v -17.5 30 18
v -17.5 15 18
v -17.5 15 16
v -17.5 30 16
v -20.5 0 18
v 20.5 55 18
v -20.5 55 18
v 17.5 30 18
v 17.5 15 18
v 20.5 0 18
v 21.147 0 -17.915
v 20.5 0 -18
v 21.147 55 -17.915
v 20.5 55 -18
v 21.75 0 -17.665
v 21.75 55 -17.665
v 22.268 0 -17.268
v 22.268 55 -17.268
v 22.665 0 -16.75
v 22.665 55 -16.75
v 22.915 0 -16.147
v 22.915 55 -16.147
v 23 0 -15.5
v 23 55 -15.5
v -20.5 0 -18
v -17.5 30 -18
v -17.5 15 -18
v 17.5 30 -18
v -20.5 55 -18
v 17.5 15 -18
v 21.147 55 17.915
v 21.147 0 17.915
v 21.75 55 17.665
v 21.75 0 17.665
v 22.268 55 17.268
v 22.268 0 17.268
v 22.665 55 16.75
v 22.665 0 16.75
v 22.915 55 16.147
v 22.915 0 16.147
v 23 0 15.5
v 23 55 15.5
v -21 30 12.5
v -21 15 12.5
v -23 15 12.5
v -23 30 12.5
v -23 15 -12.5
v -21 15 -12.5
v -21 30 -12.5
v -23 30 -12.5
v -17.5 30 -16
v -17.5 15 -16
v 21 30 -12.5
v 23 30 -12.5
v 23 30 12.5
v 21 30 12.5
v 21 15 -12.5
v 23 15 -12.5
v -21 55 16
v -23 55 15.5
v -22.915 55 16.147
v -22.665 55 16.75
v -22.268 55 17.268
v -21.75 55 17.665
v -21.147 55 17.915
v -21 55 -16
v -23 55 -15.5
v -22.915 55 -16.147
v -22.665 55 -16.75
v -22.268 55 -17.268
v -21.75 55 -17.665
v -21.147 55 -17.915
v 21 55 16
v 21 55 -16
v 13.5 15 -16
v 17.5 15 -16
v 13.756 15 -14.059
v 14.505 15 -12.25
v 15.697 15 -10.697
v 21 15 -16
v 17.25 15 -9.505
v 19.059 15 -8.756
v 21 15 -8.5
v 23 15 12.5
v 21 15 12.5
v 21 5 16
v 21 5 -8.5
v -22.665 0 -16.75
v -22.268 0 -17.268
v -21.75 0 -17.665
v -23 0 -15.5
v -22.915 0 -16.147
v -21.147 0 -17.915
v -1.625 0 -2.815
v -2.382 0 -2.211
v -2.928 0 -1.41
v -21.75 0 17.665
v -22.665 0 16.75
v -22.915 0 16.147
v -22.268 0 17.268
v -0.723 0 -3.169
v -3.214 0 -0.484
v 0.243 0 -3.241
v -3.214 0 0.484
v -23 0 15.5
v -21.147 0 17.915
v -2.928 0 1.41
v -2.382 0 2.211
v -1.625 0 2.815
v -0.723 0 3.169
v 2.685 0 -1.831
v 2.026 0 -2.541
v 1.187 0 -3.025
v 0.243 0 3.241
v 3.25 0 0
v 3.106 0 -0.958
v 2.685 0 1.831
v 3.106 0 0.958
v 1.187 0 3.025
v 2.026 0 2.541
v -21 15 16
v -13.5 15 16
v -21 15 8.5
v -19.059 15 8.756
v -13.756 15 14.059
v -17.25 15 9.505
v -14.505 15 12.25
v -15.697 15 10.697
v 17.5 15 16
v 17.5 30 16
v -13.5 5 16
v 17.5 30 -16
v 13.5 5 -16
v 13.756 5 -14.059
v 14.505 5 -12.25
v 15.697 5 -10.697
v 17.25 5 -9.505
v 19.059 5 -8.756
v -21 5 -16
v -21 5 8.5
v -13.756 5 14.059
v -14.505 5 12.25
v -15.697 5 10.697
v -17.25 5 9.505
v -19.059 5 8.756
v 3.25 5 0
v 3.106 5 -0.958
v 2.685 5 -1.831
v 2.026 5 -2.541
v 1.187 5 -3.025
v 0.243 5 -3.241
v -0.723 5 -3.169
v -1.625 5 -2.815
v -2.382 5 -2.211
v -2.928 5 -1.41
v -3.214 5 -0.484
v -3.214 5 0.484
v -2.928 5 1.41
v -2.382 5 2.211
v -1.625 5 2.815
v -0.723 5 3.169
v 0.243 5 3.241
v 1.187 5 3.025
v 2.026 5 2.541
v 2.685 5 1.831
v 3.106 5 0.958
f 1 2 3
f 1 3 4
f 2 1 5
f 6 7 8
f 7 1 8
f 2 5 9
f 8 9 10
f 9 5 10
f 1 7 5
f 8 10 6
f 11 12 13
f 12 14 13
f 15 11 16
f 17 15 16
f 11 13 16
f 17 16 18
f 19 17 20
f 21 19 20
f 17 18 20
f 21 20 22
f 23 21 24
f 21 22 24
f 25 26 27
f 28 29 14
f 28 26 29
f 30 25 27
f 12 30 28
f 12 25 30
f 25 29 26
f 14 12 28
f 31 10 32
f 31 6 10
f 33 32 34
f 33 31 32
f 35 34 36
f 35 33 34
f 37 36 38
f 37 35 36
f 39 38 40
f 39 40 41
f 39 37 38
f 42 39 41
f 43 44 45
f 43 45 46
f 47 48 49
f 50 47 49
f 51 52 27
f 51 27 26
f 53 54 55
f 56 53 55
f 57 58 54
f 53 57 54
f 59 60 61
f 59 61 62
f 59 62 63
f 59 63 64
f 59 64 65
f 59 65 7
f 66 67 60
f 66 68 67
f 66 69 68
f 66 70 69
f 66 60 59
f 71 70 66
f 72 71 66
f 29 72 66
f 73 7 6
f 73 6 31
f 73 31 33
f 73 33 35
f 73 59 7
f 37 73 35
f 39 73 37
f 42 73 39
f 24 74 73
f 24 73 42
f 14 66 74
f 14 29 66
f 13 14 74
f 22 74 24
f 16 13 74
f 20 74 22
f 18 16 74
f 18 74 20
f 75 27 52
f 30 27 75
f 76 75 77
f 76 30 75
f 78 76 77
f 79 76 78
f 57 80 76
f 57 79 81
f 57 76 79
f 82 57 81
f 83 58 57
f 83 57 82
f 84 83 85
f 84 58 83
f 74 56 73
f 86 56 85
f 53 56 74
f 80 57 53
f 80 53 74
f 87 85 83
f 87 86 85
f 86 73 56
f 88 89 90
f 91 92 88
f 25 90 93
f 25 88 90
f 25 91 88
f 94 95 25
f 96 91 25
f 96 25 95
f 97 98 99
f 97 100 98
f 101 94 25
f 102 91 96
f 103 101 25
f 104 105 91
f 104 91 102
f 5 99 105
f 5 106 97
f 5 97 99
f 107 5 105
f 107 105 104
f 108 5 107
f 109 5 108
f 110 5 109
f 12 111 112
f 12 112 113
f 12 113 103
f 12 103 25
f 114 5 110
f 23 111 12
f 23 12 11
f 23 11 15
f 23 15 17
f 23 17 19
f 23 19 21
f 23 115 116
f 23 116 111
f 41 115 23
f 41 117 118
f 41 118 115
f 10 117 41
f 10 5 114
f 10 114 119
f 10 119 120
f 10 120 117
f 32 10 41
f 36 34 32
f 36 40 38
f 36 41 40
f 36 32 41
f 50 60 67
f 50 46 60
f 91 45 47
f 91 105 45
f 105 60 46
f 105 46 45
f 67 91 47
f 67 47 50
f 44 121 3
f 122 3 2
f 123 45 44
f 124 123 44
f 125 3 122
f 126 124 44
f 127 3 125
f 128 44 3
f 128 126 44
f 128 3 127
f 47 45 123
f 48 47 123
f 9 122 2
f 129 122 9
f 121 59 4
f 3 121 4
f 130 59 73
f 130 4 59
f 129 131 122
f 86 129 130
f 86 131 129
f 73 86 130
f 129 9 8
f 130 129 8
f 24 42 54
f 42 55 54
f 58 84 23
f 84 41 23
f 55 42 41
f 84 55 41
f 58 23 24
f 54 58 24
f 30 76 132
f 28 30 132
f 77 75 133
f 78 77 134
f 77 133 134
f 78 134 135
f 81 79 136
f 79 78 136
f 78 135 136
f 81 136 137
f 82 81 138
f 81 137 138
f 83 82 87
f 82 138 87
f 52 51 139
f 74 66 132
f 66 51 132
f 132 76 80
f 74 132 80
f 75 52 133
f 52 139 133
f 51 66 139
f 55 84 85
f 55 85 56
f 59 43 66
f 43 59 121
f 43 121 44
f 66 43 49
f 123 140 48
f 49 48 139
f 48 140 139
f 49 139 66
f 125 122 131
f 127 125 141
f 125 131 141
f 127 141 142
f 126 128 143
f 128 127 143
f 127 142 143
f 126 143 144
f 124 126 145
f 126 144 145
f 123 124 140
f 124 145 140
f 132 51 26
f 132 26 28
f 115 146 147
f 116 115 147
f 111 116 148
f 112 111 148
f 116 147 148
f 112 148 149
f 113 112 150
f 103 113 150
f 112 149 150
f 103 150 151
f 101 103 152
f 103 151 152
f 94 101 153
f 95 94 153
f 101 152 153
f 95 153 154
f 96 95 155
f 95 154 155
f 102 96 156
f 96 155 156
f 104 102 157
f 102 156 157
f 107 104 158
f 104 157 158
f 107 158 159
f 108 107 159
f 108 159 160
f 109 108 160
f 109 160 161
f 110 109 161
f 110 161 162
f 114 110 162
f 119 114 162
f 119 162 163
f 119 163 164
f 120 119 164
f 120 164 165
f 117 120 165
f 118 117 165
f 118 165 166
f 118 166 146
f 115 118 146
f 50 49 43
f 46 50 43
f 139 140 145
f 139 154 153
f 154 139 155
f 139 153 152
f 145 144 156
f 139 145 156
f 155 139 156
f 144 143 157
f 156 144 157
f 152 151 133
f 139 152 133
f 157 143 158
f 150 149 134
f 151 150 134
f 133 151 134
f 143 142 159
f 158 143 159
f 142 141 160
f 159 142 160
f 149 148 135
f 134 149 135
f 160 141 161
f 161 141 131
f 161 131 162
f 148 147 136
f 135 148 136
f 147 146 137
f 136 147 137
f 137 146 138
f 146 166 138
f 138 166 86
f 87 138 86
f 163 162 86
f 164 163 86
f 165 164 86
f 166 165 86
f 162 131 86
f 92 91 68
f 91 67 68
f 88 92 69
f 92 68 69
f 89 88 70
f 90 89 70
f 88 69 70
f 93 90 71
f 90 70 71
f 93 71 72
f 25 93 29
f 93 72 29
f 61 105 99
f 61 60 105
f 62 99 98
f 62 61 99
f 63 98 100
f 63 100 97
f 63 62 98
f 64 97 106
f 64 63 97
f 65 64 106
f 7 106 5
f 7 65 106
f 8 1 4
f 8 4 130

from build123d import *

# Parameters (mm, degrees)
SKETCH1_W           = 46
SKETCH1_H           = 36
SKETCH1_W_2         = 42
SKETCH1_H_2         = 32
BOSS_EXTRUDE1_DEPTH = 55
SKETCH2_W           = 42
SKETCH2_H           = 32
BOSS_EXTRUDE2_DEPTH = 5
FILLET1_R           = 2.5
BOSS_EXTRUDE3_DEPTH = 10
SKETCH3_W           = 25
SKETCH3_H           = 15
CUT_EXTRUDE1_DEPTH  = 47
SKETCH5_W           = 35
SKETCH5_H           = 15
CUT_EXTRUDE2_DEPTH  = 37
CUT_EXTRUDE3_REACH  = 7
SKETCH7_R           = 3.25


with BuildPart() as part:
    # Sketch1 → Boss-Extrude1 (new body)
    with BuildSketch(Plane(origin=(0, 0, 0), x_dir=(1, 0, 0), z_dir=(0, 1, 0))):
        Rectangle(SKETCH1_W, SKETCH1_H)
        Rectangle(SKETCH1_W_2, SKETCH1_H_2, mode=Mode.SUBTRACT)
    extrude(amount=BOSS_EXTRUDE1_DEPTH)

    # Sketch2 → Boss-Extrude2 (add)
    with BuildSketch(Plane.XZ):
        Rectangle(SKETCH2_W, SKETCH2_H)
    extrude(amount=-BOSS_EXTRUDE2_DEPTH)

    # Fillet1
    fillet1_edges = [part.edges().sort_by_distance(p)[0] for p in [
        (-23, 27.5, -18),
        (23, 27.5, -18),
        (23, 27.5, 18),
        (-23, 27.5, 18),
    ]]
    fillet(fillet1_edges, radius=FILLET1_R)

    # Sketch4 → Boss-Extrude3 (add)
    with BuildSketch(Plane(origin=(0, 5, 0), x_dir=(1, 0, 0), z_dir=(0, 1, 0))):
        with BuildLine():
            Line((-21, -16), (-13.5, -16))
            ThreePointArc((-13.5, -16), (-15.696699141, -10.696699141), (-21, -8.5))
            Line((-21, -8.5), (-21, -16))
        make_face()
        with BuildLine():
            Line((21, 16), (13.5, 16))
            ThreePointArc((13.5, 16), (15.696699141, 10.696699141), (21, 8.5))
            Line((21, 8.5), (21, 16))
        make_face()
    extrude(amount=BOSS_EXTRUDE3_DEPTH)

    # Sketch3 → Cut-Extrude1 (cut, through all)
    with BuildSketch(Plane(origin=(23, 0, -5), x_dir=(0, 0, 1), z_dir=(-1, 0, 0))):
        with Locations((5, 22.5)):
            Rectangle(SKETCH3_W, SKETCH3_H)
    extrude(amount=CUT_EXTRUDE1_DEPTH, mode=Mode.SUBTRACT)

    # Sketch5 → Cut-Extrude2 (cut, through all)
    with BuildSketch(Plane.XY.offset(18)):
        with Locations((0, 22.5)):
            Rectangle(SKETCH5_W, SKETCH5_H)
    extrude(amount=-CUT_EXTRUDE2_DEPTH, mode=Mode.SUBTRACT)

    # Sketch7 → Cut-Extrude3 (cut, up to next)
    with BuildSketch(Plane(origin=(0, 5, 0), x_dir=(1, 0, 0), z_dir=(0, 1, 0)), mode=Mode.PRIVATE) as cut_extrude3_sk1:
        Circle(SKETCH7_R)
    cut_extrude3_tool1 = extrude(cut_extrude3_sk1.sketch, amount=-CUT_EXTRUDE3_REACH, mode=Mode.PRIVATE) & part.part
    add(cut_extrude3_tool1.solids().sort_by_distance((0, 5, 0))[0], mode=Mode.SUBTRACT)


solid = part.part
